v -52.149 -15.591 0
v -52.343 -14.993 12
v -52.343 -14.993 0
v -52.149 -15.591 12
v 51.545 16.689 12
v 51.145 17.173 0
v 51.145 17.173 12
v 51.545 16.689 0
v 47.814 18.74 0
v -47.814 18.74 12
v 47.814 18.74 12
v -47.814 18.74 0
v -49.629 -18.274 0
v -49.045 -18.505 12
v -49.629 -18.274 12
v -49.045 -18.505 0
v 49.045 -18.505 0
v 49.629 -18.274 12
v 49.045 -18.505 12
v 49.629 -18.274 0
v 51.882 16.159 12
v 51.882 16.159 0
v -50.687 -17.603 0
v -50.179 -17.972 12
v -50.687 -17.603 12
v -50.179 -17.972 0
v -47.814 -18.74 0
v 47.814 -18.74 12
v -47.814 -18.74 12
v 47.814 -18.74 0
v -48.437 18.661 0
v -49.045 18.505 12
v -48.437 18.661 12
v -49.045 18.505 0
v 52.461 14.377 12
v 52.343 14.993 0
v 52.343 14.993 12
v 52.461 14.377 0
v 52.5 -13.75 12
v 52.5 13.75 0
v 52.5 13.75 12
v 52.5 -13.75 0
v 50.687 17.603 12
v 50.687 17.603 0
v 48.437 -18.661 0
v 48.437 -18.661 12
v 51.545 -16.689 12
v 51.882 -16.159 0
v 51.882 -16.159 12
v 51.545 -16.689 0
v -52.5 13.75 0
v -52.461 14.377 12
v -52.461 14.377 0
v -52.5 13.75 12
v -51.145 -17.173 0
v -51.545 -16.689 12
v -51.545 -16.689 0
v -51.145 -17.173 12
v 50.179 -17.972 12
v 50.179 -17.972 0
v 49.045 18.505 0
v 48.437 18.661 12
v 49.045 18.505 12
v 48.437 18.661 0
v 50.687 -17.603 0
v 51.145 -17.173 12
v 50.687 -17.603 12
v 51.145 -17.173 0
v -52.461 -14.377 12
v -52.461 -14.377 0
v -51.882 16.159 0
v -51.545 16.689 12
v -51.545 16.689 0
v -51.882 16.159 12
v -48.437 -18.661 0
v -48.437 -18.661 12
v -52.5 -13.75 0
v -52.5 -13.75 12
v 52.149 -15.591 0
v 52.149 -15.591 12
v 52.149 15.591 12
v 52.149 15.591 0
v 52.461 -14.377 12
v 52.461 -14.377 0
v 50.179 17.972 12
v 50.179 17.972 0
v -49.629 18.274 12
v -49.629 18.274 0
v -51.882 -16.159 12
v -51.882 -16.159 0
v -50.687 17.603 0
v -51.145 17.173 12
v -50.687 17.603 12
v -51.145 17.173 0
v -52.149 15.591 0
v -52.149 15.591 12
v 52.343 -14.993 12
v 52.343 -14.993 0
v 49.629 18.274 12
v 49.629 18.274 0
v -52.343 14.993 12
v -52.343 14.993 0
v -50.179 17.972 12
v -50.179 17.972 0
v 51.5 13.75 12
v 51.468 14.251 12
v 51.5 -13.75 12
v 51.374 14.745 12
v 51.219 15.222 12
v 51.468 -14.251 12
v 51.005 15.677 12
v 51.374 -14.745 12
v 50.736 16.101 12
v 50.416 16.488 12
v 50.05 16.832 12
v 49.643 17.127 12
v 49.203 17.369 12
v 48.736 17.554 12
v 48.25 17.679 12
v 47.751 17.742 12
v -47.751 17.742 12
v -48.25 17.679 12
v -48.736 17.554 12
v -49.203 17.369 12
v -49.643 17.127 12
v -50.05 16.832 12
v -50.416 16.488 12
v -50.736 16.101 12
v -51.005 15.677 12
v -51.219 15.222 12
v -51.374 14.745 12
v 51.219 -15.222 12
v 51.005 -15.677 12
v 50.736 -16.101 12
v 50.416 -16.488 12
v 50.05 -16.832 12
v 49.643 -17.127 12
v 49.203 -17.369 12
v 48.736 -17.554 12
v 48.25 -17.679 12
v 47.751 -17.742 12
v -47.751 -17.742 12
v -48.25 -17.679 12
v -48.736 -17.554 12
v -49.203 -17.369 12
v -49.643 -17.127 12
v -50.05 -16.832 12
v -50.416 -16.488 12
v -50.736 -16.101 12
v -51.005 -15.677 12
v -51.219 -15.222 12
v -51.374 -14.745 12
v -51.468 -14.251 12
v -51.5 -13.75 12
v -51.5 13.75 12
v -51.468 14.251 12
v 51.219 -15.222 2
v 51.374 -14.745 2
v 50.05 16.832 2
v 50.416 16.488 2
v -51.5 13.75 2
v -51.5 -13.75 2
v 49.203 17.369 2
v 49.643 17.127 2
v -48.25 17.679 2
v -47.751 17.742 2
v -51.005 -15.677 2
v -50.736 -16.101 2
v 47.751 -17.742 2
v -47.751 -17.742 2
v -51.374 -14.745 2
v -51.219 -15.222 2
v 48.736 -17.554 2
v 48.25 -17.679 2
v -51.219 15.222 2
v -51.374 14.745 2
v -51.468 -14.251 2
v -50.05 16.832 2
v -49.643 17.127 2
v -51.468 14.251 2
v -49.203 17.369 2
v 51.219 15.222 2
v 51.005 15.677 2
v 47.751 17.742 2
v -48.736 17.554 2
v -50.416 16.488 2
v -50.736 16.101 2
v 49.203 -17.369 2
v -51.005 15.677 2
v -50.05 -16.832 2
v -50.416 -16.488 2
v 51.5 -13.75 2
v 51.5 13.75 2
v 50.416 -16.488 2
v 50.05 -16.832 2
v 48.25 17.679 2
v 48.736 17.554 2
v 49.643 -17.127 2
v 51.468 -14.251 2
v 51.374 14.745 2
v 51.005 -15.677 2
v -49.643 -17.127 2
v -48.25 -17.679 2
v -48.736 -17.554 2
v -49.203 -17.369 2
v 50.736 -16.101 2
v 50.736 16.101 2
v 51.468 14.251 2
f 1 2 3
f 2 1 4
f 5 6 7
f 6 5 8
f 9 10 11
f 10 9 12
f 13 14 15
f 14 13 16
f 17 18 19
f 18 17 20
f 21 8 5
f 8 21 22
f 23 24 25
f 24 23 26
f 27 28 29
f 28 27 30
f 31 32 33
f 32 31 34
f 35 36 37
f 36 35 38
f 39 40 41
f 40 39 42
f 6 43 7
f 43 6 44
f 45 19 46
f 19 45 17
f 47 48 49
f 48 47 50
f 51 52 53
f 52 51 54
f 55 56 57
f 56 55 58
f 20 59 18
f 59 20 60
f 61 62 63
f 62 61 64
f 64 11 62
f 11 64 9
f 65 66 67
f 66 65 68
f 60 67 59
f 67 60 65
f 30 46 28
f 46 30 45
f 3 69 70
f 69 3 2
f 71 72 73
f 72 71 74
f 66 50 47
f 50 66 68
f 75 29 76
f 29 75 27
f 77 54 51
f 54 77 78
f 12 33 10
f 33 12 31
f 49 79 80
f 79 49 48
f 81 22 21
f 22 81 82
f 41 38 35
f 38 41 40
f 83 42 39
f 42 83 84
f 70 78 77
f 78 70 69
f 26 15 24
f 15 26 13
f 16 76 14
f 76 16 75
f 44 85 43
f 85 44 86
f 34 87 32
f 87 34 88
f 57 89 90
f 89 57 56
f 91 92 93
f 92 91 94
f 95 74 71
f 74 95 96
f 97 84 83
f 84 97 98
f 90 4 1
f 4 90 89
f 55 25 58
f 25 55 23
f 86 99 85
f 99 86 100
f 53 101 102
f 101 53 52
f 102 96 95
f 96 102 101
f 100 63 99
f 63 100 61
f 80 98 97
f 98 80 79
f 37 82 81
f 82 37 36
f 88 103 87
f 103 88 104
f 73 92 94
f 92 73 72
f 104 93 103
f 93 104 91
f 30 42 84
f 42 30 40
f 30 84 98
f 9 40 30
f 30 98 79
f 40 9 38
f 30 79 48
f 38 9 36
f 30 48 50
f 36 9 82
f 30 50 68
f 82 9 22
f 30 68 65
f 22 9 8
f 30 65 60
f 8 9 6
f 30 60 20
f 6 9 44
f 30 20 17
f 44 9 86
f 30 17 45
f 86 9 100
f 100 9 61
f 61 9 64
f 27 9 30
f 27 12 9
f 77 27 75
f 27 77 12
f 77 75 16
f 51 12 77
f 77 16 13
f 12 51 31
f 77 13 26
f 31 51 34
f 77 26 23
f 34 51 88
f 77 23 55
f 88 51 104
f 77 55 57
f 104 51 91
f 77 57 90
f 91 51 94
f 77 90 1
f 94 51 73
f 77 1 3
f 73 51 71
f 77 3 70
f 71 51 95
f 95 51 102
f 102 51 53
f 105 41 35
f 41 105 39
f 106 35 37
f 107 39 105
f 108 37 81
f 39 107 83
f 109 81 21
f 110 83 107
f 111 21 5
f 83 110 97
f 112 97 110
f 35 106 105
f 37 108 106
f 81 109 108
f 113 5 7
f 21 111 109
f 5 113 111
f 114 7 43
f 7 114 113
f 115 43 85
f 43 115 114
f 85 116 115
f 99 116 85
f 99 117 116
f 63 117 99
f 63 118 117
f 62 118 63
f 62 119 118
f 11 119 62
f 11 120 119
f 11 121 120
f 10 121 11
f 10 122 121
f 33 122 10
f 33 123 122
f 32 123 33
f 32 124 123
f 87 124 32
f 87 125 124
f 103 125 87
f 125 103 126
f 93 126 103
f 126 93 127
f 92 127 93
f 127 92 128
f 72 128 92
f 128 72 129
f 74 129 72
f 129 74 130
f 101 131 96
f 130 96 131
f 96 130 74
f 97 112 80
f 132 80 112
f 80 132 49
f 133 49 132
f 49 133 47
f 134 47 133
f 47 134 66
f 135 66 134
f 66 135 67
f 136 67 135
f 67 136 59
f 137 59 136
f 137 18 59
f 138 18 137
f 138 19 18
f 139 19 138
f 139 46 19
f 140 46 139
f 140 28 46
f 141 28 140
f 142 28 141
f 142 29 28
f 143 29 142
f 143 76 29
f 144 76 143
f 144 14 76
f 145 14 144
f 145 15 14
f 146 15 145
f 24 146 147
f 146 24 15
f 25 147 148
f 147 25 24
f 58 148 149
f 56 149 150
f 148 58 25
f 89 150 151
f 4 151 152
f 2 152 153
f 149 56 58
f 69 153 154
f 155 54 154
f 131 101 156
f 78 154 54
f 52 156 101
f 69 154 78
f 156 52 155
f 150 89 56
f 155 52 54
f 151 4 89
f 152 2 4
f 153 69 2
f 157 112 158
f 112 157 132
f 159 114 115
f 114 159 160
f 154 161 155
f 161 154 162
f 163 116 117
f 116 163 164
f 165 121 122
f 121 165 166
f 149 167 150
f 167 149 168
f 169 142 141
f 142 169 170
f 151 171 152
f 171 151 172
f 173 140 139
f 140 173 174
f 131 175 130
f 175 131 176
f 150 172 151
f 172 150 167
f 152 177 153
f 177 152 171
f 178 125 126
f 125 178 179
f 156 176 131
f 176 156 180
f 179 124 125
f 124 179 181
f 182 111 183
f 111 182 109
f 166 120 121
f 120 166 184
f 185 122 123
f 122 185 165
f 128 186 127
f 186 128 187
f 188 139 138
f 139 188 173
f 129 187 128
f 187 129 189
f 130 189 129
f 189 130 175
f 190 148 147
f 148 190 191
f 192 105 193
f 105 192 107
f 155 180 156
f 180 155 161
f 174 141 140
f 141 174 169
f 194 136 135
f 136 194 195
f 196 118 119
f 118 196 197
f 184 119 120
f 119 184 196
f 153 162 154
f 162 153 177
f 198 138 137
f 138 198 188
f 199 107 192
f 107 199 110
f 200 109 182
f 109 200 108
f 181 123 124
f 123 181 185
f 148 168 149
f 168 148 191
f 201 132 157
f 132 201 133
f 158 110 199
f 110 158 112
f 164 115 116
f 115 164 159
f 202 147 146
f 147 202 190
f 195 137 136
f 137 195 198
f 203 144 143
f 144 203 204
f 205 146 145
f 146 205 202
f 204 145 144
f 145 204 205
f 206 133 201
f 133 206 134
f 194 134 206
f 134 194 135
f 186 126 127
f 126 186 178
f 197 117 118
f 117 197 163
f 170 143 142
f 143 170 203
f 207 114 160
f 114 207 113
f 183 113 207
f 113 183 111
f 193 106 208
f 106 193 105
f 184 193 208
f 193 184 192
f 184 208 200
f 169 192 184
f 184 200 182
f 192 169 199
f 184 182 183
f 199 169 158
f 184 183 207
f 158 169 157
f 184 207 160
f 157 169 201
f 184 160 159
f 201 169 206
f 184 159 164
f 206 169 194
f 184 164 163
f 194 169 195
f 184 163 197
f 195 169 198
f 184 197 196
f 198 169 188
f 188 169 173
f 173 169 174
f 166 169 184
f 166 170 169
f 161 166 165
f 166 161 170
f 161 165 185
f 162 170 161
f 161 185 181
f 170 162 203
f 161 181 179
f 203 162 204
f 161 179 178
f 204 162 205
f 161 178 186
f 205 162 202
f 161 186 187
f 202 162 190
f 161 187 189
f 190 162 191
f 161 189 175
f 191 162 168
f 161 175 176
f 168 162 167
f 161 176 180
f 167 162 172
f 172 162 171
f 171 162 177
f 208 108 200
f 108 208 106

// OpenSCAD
$fn = 50;


difference() {
	union() {
		hull() {
			translate(v = [-47.5000000000, 13.7500000000, 0]) {
				cylinder(h = 12, r = 5);
			}
			translate(v = [47.5000000000, 13.7500000000, 0]) {
				cylinder(h = 12, r = 5);
			}
			translate(v = [-47.5000000000, -13.7500000000, 0]) {
				cylinder(h = 12, r = 5);
			}
			translate(v = [47.5000000000, -13.7500000000, 0]) {
				cylinder(h = 12, r = 5);
			}
		}
	}
	union() {
		translate(v = [0, 0, 2]) {
			hull() {
				translate(v = [-47.5000000000, 13.7500000000, 0]) {
					cylinder(h = 10, r = 4);
				}
				translate(v = [47.5000000000, 13.7500000000, 0]) {
					cylinder(h = 10, r = 4);
				}
				translate(v = [-47.5000000000, -13.7500000000, 0]) {
					cylinder(h = 10, r = 4);
				}
				translate(v = [47.5000000000, -13.7500000000, 0]) {
					cylinder(h = 10, r = 4);
				}
			}
		}
	}
}
